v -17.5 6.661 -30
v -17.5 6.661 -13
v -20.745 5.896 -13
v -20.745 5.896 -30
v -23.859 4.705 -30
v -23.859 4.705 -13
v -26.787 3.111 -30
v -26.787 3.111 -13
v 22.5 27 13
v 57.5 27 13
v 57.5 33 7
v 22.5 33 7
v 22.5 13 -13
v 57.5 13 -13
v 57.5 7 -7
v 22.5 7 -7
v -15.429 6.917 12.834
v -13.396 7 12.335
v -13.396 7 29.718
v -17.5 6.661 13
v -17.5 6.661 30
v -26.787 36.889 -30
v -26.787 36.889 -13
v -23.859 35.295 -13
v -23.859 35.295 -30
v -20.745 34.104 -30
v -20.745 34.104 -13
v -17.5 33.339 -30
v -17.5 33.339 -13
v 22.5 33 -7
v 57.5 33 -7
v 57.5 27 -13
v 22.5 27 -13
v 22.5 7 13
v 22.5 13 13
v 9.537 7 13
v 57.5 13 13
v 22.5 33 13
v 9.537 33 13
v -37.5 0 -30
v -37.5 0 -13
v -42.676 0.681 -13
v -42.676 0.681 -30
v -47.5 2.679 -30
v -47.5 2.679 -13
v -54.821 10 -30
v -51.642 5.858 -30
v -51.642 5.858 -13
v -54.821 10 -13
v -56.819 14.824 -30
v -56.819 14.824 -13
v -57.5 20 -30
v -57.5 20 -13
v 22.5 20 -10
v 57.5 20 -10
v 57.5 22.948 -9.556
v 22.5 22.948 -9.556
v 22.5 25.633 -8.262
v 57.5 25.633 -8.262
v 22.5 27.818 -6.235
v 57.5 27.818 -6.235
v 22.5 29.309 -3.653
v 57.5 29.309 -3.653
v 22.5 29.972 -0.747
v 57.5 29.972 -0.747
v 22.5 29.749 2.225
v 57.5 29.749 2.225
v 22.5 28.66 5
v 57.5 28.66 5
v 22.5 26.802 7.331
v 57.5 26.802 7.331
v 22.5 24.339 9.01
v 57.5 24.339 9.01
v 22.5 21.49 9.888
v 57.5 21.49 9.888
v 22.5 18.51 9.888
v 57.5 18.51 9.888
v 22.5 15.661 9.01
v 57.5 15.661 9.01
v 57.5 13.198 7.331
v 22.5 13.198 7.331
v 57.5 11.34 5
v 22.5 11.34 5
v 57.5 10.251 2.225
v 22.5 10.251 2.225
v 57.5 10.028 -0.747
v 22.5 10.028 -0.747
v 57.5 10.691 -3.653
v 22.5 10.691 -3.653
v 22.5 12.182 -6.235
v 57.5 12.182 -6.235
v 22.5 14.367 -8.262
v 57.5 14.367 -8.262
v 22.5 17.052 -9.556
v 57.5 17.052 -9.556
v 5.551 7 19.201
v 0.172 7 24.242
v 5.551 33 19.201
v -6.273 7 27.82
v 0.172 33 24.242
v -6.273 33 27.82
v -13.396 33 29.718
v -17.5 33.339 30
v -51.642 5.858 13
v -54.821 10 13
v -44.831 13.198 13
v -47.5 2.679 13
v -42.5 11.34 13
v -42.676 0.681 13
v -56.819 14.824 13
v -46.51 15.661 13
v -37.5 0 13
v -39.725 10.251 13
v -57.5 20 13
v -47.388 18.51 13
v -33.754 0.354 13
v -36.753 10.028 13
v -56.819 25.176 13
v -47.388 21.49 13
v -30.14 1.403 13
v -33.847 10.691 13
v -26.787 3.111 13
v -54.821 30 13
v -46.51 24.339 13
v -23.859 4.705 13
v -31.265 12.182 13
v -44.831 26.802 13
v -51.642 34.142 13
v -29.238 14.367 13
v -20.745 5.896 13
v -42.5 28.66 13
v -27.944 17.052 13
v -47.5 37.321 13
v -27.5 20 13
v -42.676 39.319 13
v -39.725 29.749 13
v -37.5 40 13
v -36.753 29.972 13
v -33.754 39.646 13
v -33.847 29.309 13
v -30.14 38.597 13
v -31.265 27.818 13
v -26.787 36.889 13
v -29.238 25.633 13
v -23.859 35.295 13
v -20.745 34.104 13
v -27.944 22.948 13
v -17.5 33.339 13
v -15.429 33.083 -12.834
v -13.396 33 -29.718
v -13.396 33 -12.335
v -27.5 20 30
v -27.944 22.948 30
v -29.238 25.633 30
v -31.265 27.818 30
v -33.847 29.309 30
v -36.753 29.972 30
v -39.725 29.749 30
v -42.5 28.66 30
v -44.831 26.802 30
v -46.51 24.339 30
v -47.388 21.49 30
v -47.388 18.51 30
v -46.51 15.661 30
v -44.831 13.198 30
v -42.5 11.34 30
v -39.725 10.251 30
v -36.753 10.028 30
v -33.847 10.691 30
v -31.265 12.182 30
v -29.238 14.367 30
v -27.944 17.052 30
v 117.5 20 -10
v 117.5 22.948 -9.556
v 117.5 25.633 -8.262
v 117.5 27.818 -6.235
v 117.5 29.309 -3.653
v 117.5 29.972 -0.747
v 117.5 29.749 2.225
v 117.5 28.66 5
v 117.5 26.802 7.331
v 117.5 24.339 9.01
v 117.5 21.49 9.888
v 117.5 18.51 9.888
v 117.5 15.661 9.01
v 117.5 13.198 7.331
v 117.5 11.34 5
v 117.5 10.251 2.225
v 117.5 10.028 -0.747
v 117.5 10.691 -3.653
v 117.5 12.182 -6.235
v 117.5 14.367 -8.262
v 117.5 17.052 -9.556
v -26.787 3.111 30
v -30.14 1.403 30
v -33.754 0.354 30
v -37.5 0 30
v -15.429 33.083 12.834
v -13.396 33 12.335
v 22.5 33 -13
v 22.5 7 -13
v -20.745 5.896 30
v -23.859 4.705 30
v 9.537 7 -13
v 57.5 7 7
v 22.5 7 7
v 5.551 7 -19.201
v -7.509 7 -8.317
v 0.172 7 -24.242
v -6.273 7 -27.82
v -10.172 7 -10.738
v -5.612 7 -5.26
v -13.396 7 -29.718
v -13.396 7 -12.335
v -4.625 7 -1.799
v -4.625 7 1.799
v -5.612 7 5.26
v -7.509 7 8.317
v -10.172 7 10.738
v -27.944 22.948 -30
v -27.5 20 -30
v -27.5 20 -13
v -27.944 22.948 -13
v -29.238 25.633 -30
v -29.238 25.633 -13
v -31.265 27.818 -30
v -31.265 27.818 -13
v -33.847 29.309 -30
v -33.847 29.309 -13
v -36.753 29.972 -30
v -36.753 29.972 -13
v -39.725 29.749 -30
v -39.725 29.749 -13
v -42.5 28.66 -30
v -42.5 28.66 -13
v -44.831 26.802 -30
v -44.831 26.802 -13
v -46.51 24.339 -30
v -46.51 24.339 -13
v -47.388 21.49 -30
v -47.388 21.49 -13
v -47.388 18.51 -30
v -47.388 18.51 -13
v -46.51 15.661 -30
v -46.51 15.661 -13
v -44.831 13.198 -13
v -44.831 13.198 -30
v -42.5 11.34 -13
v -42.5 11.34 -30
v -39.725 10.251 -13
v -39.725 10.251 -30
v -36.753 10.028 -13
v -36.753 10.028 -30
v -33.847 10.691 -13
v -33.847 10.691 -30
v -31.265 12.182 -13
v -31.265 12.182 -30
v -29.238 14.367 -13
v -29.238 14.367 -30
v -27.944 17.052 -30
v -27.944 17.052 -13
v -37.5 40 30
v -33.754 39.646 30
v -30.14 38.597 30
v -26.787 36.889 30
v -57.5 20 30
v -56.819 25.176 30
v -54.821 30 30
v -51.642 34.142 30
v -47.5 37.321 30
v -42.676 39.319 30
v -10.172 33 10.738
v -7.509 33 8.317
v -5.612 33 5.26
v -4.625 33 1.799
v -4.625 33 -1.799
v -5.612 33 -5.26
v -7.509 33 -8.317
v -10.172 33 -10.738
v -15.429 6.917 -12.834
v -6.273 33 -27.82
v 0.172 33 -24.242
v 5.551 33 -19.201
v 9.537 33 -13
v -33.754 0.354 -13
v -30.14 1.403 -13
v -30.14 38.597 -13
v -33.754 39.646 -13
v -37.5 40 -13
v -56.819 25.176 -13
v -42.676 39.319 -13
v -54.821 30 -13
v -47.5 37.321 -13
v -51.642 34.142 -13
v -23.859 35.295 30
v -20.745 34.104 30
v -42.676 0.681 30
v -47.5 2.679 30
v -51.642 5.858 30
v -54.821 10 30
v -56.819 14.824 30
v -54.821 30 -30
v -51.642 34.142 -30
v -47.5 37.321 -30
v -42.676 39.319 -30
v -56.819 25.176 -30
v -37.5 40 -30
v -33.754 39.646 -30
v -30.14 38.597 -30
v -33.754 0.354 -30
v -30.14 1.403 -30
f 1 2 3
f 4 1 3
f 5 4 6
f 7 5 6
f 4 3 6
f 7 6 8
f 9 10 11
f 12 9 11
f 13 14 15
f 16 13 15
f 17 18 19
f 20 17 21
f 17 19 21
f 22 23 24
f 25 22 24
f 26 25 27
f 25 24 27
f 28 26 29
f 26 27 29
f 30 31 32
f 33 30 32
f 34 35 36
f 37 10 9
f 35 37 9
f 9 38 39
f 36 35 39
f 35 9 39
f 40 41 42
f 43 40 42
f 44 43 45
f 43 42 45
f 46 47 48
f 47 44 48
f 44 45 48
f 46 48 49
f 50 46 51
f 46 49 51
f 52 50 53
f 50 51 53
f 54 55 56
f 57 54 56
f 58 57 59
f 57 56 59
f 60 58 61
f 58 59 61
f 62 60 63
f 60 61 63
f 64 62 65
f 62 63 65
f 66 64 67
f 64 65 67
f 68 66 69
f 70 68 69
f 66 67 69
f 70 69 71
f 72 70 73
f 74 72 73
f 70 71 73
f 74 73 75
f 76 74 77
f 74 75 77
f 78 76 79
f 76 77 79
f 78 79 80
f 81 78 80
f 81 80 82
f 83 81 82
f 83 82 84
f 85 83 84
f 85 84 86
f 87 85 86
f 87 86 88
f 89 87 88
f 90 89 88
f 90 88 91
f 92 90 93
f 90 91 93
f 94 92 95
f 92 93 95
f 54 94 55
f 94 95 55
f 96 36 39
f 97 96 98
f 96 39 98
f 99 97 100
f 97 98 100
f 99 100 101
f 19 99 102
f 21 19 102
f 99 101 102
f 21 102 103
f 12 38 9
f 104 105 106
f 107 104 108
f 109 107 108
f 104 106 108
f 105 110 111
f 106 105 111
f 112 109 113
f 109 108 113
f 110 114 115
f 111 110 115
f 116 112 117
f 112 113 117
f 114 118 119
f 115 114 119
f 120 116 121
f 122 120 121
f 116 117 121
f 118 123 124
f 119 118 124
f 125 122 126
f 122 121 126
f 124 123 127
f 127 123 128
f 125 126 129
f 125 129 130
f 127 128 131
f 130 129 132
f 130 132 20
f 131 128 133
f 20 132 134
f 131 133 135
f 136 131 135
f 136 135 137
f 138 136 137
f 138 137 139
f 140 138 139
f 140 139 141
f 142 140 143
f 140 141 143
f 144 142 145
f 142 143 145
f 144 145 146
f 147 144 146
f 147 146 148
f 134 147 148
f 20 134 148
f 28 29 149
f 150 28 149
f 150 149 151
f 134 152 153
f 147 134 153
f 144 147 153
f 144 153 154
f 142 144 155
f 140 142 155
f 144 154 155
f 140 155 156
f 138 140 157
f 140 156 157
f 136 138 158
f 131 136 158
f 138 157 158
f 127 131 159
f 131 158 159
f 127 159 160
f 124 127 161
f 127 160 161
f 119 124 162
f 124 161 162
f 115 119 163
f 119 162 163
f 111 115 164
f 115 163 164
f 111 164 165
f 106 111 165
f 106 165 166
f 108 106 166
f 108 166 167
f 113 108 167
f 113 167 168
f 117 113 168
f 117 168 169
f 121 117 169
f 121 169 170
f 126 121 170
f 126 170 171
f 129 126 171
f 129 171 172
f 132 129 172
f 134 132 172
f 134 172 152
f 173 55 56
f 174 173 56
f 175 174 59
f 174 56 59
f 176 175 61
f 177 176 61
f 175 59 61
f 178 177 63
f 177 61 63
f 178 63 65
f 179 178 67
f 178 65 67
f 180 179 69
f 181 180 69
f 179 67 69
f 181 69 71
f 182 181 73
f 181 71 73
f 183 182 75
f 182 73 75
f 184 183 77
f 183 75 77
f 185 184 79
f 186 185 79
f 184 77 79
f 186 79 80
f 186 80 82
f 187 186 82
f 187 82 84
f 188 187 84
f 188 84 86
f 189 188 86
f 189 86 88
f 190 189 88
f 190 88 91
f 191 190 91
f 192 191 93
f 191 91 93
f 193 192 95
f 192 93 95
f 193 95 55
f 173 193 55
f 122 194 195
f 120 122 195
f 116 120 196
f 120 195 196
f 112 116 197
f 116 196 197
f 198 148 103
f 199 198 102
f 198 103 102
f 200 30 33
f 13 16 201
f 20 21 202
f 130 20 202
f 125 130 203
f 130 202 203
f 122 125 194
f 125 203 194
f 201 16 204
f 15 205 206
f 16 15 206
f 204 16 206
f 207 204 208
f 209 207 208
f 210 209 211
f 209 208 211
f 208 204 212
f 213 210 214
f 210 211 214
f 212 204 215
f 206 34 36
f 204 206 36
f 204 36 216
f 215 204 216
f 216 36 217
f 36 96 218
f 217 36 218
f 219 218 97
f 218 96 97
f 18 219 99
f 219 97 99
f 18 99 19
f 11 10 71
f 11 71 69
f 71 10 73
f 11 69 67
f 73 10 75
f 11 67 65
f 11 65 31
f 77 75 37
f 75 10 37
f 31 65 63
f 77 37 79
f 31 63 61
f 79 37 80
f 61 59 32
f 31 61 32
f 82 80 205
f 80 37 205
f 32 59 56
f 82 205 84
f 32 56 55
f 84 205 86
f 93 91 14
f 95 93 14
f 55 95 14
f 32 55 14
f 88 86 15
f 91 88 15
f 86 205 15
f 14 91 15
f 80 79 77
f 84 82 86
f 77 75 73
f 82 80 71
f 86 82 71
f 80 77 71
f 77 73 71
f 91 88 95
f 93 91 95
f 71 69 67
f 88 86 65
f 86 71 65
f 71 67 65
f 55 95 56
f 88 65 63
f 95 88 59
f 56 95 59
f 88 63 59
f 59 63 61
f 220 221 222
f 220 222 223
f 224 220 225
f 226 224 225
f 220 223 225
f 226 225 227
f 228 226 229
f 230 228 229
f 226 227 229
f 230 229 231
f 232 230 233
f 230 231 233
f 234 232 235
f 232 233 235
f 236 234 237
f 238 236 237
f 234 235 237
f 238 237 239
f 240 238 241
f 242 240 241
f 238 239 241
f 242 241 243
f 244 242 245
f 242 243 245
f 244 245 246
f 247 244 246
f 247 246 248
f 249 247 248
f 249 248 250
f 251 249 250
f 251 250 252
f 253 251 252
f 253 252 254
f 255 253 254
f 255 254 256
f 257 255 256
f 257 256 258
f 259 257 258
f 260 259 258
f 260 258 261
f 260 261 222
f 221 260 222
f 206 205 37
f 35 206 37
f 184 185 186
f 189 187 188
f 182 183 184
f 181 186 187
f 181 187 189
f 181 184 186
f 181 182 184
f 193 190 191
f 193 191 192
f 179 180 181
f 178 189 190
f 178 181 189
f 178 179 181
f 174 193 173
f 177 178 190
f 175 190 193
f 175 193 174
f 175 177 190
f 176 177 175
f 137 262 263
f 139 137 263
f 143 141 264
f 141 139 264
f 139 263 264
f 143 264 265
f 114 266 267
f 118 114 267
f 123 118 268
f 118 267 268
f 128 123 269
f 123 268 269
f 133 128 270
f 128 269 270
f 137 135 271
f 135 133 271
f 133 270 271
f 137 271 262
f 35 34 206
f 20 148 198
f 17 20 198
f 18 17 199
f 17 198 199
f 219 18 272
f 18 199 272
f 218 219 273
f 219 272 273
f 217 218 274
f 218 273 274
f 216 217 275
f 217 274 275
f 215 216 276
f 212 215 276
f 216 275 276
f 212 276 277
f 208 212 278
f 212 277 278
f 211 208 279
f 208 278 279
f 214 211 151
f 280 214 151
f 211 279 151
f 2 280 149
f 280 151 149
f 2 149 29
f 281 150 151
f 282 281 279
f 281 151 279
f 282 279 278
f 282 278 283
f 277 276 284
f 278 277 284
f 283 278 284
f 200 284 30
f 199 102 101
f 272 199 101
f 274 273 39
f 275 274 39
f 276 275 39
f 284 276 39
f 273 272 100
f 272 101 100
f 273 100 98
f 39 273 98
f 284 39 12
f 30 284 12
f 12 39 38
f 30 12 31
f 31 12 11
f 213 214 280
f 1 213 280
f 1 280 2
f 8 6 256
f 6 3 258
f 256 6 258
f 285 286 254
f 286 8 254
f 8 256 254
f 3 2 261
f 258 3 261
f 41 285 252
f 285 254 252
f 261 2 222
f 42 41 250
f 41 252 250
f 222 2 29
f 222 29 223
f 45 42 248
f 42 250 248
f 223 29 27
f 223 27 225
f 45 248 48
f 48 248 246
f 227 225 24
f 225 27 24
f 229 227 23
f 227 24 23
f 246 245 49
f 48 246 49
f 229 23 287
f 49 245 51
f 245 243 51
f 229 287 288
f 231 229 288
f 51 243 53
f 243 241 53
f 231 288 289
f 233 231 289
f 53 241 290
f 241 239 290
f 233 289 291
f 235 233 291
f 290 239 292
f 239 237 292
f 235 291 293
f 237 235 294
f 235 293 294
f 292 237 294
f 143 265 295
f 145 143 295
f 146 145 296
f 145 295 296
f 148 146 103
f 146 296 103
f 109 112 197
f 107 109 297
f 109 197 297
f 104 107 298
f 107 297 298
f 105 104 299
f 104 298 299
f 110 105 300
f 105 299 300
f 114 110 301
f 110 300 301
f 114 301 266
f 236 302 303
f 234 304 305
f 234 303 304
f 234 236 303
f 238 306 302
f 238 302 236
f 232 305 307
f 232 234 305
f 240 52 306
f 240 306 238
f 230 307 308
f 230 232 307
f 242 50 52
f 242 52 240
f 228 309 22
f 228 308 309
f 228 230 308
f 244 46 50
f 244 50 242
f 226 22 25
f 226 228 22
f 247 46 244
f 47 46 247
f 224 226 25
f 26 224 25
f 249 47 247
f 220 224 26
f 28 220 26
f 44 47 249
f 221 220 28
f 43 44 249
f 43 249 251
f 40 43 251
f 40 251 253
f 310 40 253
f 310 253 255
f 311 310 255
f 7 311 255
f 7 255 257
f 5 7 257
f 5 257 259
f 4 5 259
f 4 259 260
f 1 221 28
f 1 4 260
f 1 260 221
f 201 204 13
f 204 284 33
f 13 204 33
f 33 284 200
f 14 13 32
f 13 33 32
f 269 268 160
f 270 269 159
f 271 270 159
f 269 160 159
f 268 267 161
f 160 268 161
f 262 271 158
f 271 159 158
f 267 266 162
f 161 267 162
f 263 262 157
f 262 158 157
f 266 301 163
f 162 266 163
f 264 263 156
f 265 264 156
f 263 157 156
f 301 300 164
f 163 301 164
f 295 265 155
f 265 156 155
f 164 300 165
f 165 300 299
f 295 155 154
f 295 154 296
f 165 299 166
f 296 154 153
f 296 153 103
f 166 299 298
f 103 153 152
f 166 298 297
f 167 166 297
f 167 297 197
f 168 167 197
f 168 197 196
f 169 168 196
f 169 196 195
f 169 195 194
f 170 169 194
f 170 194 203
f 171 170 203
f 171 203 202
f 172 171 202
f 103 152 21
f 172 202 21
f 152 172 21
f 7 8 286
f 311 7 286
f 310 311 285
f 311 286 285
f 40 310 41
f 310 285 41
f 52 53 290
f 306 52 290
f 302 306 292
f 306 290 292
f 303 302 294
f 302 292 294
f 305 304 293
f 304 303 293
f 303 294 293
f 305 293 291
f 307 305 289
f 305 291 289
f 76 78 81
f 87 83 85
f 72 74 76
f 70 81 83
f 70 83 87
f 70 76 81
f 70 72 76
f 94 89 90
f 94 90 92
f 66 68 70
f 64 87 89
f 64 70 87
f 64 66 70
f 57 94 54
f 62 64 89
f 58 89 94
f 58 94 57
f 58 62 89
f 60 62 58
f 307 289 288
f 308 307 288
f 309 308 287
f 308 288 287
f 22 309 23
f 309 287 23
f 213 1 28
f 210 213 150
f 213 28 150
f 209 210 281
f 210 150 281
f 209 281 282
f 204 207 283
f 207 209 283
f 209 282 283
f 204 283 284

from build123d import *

# Parameters (mm, degrees)
SKETCH1_W           = 115
SKETCH1_H           = 60
BOSS_EXTRUDE1_DEPTH = 40
CUT_EXTRUDE1_DEPTH  = 40
CUT_EXTRUDE3_DEPTH  = 98
SKETCH3_4_R         = 10
CUT_EXTRUDE4_DEPTH  = 98
SKETCH4_R           = 10
BOSS_EXTRUDE2_DEPTH = 60
CUT_EXTRUDE5_START  = -35
SKETCH4_3_R         = 10
CUT_EXTRUDE5_DEPTH  = 35


with BuildPart() as part:
    # Sketch1 → Boss-Extrude1 (new body)
    with BuildSketch(Plane(origin=(0, 0, 0), x_dir=(1, 0, 0), z_dir=(0, 1, 0))):
        Rectangle(SKETCH1_W, SKETCH1_H)
    extrude(amount=BOSS_EXTRUDE1_DEPTH)

    # Sketch2 → Cut-Extrude1 (cut)
    with BuildSketch(Plane(origin=(0, 40, 0), x_dir=(1, 0, 0), z_dir=(0, 1, 0))):
        with BuildLine():
            Line((-17.5, 13), (-57.5, 13))
            Line((-57.5, 13), (-57.5, -13))
            Line((-57.5, -13), (-17.5, -13))
            ThreePointArc((-17.5, -13), (-4.5, 0), (-17.5, 13))
        make_face()
        with BuildLine():
            Line((57.5, 30), (-17.5, 30))
            ThreePointArc((-17.5, 30), (-1.531280577, 25.396850198), (9.537011669, 13))
            Line((9.537011669, 13), (57.5, 13))
            Line((57.5, 13), (57.5, 30))
        make_face()
        with BuildLine():
            ThreePointArc((9.537011669, -13), (-1.531280577, -25.396850198), (-17.5, -30))
            Line((-17.5, -30), (57.5, -30))
            Line((57.5, -30), (57.5, -13))
            Line((57.5, -13), (9.537011669, -13))
        make_face()
    extrude(amount=-CUT_EXTRUDE1_DEPTH, mode=Mode.SUBTRACT)

    # Sketch3 → Cut-Extrude3 (cut)
    with BuildSketch(Plane.XY.offset(30)):
        with BuildLine():
            Line((57.5, 7), (-13.396058414, 7))
            ThreePointArc((-13.396058414, 7), (-20.368225301, 6.008100485), (-26.787137073, 3.111111111))
            ThreePointArc((-26.787137073, 3.111111111), (-31.922266567, 0.79351959), (-37.50000016, 0))
            Line((-37.50000016, 0), (57.5, 0))
            Line((57.5, 0), (57.5, 7))
        make_face()
        with BuildLine():
            Line((-13.396058414, 33), (57.5, 33))
            Line((57.5, 33), (57.5, 40))
            Line((57.5, 40), (-37.5, 40))
            ThreePointArc((-37.5, 40), (-31.92226649, 39.206480388), (-26.787137073, 36.888888889))
            ThreePointArc((-26.787137073, 36.888888889), (-20.368225301, 33.991899515), (-13.396058414, 33))
        make_face()
        with BuildLine():
            Line((-57.5, 0), (-37.50000016, 0))
            ThreePointArc((-37.50000016, 0), (-51.642135645, 5.857864398), (-57.5, 19.999999901))
            Line((-57.5, 19.999999901), (-57.5, 0))
        make_face()
        with BuildLine():
            Line((-57.5, 40), (-57.5, 19.999999901))
            ThreePointArc((-57.5, 19.999999901), (-51.642135659, 34.142135589), (-37.5, 40))
            Line((-37.5, 40), (-57.5, 40))
        make_face()
    extrude(amount=-CUT_EXTRUDE3_DEPTH, mode=Mode.SUBTRACT)

    # Sketch3<4> → Cut-Extrude4 (cut)
    with BuildSketch(Plane.XY.offset(30)):
        with Locations((-37.5, 20)):
            Circle(SKETCH3_4_R)
    extrude(amount=-CUT_EXTRUDE4_DEPTH, mode=Mode.SUBTRACT)

    # Sketch4 → Boss-Extrude2 (add)
    with BuildSketch(Plane(origin=(57.5, 0, 0), x_dir=(0, 0, -1), z_dir=(1, 0, 0))):
        with Locations((0, 20)):
            Circle(SKETCH4_R)
    extrude(amount=BOSS_EXTRUDE2_DEPTH)

    # Sketch4<3> → Cut-Extrude5 (cut)
    with BuildSketch(Plane(origin=(57.5, 0, 0), x_dir=(0, 0, -1), z_dir=(1, 0, 0)).offset(CUT_EXTRUDE5_START)):
        with Locations((0, 20)):
            Circle(SKETCH4_3_R)
        Polygon((-13, 33), (-13, 27), (-7, 33), align=None)
        Polygon((13, 33), (7, 33), (13, 27), align=None)
        Polygon((13, 7), (13, 13), (7, 7), align=None)
        Polygon((-13, 7), (-7, 7), (-13, 13), align=None)
    extrude(amount=CUT_EXTRUDE5_DEPTH, mode=Mode.SUBTRACT)


with BuildPart() as cut_extrude5_piece_1:
    # of the separate pieces the step leaves, piece 1, a body of its own (cut_extrude5_pieces)
    add(part.part.solids().sort_by_distance((-26.787137073, 3.111111111, -30))[0])


with BuildPart() as cut_extrude5_piece_2:
    # of the separate pieces the step leaves, piece 2, a body of its own (cut_extrude5_pieces)
    add(part.part.solids().sort_by_distance((117.5, 20, -10))[0])


solid = Compound([cut_extrude5_piece_1.part, cut_extrude5_piece_2.part])
